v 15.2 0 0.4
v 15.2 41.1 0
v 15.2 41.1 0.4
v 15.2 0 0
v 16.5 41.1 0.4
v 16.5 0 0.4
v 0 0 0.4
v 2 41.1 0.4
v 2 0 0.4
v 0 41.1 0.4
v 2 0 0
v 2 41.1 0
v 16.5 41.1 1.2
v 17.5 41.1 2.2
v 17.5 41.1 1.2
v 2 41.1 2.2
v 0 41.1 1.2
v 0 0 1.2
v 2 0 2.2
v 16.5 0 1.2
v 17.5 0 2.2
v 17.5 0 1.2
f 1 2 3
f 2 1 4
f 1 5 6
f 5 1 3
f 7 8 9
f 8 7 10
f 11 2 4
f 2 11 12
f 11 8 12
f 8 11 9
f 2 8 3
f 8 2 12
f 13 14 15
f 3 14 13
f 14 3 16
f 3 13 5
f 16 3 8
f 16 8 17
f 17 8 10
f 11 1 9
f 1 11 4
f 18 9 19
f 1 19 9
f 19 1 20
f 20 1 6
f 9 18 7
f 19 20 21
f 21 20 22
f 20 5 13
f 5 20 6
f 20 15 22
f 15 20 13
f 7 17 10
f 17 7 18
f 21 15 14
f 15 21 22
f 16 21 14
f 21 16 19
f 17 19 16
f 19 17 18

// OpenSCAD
eps = 0.01;
$fn = 90;

// x parameters
x = 17.5;
x_l_l = 2;
x_l_r = 2.3;
x_m_r = 1;
x_u_l = x_l_l;
// y is just one
y = 41.1;

// z parameters
z_l = 0.4;
z_m = 0.8;
z_u = 1;

// triangle parameteres
t_x = 5;
t_y = 16;
t_z = 9.6-z_l+z_m-z_u;

// holes parameters
// small holes
sh_d = 4.4;
sh_D = 7.4;
// big holes
bh_d = 10.5;
bh_D = 13;
bh_t = 0.9;
b_xo = 1.5;


module door_piece()
{

    difference()
    {
        union()
        {
            // lower cube
            translate([x_l_l,0,0])
                cube([x-x_l_l-x_l_r,y,z_l]);
            // middle cube
            translate([0,0,z_l])
                cube([x-x_m_r,y,z_m]);
            // upper cube
            translate([x_u_l,0,z_l+z_m])
               cube([x-x_u_l,y,z_u]);
            // upper slope
            _a = 0.1;
            translate([0,0,z_l+z_m]) hull()
            {
                translate([0,0,-eps]) cube([x_u_l,y,eps]);
                translate([x_u_l,0,0]) cube([eps,y,z_u]);
            }
        }
    }
}

door_piece();
